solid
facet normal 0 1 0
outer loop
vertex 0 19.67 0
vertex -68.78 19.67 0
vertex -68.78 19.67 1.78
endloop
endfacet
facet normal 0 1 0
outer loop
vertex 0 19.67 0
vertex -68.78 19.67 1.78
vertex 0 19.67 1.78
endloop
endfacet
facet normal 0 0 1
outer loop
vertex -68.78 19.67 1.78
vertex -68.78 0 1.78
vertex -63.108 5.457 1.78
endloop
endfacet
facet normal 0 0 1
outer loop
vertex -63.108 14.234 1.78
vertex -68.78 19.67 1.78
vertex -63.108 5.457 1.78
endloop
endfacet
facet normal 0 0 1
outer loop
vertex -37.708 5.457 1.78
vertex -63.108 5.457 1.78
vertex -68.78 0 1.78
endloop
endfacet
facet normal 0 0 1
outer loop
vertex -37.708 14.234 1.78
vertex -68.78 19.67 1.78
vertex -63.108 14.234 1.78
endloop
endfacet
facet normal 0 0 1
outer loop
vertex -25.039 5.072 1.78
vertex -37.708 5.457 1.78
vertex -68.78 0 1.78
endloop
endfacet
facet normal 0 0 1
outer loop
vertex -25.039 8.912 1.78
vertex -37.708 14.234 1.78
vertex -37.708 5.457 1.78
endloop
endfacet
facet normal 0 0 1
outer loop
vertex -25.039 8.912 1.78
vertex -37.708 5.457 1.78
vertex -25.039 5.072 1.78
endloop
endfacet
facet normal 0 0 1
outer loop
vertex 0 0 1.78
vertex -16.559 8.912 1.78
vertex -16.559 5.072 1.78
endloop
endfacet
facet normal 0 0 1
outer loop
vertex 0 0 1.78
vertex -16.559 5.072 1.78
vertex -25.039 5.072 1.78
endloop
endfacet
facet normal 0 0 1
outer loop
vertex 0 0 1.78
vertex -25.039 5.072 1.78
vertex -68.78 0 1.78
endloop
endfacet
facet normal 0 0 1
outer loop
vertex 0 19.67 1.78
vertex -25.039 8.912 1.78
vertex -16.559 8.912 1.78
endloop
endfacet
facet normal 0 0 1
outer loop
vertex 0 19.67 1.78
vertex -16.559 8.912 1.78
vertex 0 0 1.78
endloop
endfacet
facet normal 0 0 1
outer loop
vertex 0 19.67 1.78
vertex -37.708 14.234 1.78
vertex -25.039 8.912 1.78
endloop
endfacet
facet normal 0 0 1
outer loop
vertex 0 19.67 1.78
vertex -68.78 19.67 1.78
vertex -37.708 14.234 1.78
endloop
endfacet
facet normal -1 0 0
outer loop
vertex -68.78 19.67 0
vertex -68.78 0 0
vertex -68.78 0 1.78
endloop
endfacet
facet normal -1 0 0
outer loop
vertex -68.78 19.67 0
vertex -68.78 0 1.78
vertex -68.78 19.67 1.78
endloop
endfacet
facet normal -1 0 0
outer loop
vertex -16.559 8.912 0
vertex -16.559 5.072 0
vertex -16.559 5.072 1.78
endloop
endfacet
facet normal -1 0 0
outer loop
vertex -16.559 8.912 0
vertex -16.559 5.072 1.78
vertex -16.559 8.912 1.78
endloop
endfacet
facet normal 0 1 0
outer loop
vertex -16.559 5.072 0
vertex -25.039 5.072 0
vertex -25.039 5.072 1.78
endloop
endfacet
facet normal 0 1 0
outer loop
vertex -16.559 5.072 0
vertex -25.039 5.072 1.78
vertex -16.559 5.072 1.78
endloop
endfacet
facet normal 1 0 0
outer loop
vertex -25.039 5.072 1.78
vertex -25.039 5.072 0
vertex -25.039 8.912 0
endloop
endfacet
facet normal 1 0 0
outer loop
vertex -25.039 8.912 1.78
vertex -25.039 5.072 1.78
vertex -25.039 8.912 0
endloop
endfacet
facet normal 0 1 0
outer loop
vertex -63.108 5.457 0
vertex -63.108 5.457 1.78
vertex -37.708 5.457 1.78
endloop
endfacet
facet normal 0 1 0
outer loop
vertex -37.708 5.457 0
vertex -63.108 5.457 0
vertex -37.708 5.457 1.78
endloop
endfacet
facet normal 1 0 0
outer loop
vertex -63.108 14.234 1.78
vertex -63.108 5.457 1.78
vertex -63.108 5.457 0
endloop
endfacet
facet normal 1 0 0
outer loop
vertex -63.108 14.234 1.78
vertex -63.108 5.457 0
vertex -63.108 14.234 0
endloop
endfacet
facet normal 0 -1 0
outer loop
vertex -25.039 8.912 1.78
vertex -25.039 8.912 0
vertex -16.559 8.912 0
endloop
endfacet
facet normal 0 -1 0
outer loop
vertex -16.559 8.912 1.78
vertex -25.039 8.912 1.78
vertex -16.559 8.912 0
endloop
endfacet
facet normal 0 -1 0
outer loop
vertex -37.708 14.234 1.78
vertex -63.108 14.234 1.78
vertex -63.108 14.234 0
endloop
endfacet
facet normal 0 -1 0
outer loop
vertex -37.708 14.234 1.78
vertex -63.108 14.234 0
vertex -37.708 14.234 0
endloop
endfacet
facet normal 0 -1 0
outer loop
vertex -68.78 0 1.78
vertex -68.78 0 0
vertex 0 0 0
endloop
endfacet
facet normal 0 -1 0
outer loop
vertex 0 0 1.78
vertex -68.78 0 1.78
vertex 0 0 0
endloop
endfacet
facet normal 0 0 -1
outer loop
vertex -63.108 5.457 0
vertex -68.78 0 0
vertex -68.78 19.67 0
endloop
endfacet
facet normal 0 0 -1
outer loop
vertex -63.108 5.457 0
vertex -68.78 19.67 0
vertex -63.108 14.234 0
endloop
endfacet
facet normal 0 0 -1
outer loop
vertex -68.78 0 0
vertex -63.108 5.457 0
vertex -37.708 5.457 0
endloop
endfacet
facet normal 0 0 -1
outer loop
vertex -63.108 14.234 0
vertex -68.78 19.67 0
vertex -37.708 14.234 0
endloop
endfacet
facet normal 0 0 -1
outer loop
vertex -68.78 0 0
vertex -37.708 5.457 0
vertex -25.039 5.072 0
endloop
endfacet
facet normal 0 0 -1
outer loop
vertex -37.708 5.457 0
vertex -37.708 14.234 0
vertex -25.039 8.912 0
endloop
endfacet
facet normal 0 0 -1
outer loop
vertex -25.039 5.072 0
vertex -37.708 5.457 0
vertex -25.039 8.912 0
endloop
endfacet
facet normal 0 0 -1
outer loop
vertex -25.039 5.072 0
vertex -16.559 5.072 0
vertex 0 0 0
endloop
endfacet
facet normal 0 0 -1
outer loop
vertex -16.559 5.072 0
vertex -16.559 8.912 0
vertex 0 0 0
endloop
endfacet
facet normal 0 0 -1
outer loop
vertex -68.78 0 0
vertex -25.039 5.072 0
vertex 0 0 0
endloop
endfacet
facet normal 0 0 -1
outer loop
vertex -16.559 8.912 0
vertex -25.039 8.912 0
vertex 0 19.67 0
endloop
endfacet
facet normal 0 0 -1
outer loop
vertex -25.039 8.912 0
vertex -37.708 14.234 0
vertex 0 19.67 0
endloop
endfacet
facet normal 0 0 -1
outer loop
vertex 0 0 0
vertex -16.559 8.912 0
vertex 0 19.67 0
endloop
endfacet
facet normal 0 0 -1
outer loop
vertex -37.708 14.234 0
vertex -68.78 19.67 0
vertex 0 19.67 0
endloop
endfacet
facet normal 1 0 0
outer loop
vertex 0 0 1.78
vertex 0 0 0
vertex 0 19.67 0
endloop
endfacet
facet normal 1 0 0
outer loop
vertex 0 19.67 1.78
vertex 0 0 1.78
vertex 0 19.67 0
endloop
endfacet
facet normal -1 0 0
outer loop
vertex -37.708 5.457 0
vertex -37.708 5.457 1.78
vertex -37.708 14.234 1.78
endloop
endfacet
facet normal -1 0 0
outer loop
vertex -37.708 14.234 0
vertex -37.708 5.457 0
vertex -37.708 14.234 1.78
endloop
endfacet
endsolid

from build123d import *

# Parameters (mm, degrees)
F0_W     = 68.78
F0_H     = 19.67
F1_DEPTH = 1.78
F2_W     = 25.4
F2_H     = 8.776869
F3_DEPTH = 25.4
F4_W     = 8.480195
F4_H     = 3.840108
F5_DEPTH = 1.781


with BuildPart() as f1:
    # F0 (on Top) → F1 (new body)
    with BuildSketch(Plane.XY):
        with Locations((-34.39, 9.835)):
            Rectangle(F0_W, F0_H)
    extrude(amount=F1_DEPTH)

    # F2 (on face) → F3 (cut)
    with BuildSketch(Plane.XY.offset(1.78)):
        with Locations((-50.408047, 9.845546)):
            Rectangle(F2_W, F2_H)
    extrude(amount=-F3_DEPTH, mode=Mode.SUBTRACT)

    # F4 (on Top) → F5 (cut, through all)
    with BuildSketch(Plane.XY):
        with Locations((-20.799336, 6.992206)):
            Rectangle(F4_W, F4_H)
    extrude(amount=F5_DEPTH, mode=Mode.SUBTRACT)


solid = f1.part
